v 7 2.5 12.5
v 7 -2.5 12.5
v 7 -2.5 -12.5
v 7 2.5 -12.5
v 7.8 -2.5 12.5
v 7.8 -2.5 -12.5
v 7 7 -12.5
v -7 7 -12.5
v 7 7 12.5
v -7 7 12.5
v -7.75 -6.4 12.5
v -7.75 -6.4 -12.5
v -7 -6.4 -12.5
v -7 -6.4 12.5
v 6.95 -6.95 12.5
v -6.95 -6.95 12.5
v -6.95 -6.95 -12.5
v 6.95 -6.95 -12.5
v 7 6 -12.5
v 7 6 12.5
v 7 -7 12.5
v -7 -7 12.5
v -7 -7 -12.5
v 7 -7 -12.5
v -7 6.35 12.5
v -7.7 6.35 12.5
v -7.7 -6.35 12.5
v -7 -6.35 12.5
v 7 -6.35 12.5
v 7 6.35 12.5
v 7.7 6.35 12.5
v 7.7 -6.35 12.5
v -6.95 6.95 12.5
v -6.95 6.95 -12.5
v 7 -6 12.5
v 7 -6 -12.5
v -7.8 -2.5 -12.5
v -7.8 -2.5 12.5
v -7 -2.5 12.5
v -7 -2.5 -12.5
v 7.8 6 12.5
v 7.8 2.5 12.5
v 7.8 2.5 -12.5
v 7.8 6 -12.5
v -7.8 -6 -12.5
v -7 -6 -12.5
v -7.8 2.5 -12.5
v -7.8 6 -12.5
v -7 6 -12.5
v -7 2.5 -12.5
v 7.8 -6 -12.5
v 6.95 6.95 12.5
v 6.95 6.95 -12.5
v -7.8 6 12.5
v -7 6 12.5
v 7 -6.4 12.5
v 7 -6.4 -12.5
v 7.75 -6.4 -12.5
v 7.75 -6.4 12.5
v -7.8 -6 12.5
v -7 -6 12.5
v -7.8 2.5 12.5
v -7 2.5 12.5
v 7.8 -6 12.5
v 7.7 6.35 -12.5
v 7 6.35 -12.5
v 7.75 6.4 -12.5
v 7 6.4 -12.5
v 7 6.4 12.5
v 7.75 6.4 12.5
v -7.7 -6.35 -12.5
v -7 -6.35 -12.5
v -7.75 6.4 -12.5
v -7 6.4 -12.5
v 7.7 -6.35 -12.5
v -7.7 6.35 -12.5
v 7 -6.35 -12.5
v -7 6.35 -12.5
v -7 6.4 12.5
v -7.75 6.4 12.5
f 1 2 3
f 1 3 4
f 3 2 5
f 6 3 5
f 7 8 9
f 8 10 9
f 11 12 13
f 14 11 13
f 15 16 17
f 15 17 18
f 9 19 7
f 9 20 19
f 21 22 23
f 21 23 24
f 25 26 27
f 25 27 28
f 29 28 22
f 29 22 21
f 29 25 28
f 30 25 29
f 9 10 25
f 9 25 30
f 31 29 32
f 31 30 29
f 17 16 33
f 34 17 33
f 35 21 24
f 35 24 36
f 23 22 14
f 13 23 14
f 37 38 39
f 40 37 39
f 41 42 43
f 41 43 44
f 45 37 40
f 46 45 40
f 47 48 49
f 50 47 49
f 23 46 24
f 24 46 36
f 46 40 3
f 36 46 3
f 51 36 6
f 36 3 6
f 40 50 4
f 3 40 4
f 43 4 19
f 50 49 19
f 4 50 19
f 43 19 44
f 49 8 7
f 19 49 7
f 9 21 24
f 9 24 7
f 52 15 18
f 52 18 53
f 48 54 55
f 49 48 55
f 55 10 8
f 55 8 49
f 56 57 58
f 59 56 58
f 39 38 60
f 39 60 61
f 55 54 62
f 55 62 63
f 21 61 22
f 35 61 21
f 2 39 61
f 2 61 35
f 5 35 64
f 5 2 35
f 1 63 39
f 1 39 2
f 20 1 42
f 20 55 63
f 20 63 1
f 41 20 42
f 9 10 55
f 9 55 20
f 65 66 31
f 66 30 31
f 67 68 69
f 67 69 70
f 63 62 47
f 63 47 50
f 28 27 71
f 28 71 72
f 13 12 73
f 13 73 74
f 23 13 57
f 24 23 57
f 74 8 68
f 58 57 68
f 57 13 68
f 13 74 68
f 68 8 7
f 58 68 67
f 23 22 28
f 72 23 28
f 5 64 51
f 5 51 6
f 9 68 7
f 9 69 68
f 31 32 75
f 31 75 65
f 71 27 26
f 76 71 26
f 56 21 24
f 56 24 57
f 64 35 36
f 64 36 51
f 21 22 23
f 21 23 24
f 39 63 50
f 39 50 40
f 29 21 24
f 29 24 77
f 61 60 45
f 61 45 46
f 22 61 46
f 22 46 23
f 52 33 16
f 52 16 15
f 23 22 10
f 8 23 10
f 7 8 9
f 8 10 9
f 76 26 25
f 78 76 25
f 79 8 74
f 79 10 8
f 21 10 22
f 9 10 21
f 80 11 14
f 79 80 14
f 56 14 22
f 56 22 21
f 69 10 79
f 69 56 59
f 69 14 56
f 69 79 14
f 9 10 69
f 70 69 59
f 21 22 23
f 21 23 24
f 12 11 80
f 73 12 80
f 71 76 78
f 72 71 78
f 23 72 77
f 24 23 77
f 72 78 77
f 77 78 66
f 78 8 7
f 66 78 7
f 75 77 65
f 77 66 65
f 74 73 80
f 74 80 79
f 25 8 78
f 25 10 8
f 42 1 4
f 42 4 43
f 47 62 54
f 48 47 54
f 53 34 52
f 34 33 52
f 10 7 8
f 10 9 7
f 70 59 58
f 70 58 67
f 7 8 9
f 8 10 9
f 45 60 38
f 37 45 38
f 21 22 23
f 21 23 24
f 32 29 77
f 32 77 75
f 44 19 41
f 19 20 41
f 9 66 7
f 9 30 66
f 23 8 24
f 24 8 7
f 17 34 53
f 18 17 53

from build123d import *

# Parameters (mm, degrees)
F0_W     = 14
F0_H     = 14
F1_DEPTH = 12.5
F2_W     = 14
F2_H     = 0.6
F2_W_2   = 0.75
F2_H_2   = 12.8
F3_DEPTH = 12.5
F4_W     = 0.8
F4_H     = 3.5
F5_DEPTH = 12.5
F6_W     = 13.9
F6_H     = 13.9
F7_DEPTH = 12.5
F8_W     = 14
F8_H     = 0.65
F8_W_2   = 0.7
F8_H_2   = 12.7
F9_DEPTH = 12.5


with BuildPart() as f1:
    # F0 (on Top) → F1 (new body, symmetric)
    with BuildSketch(Plane.XY):
        Rectangle(F0_W, F0_H)
    extrude(amount=F1_DEPTH, both=True)


with BuildPart() as f3:
    # F2 (on Top) → F3 (new body, symmetric)
    with BuildSketch(Plane.XY):
        with Locations((0, 6.7)):
            Rectangle(F2_W, F2_H)
        with Locations((7.375, 0)):
            Rectangle(F2_W_2, F2_H_2)
        Rectangle(F2_W, F2_H_2)
        with Locations((-7.375, 0)):
            Rectangle(F2_W_2, F2_H_2)
        with Locations((0, -6.7)):
            Rectangle(F2_W, F2_H)
    extrude(amount=F3_DEPTH, both=True)


with BuildPart() as f5:
    # F4 (on Top) → F5 (new body, symmetric)
    with BuildSketch(Plane.XY):
        Polygon((7, 6), (7, 7), (-7, 7), (-7, 6), (-7, 2.5), (-7, -2.5), (-7, -6), (-7, -7), (7, -7), (7, -6), (7, -2.5), (7, 2.5), align=None)
        with Locations((7.4, 4.25)):
            Rectangle(F4_W, F4_H)
        with Locations((-7.4, 4.25)):
            Rectangle(F4_W, F4_H)
        with Locations((7.4, -4.25)):
            Rectangle(F4_W, F4_H)
        with Locations((-7.4, -4.25)):
            Rectangle(F4_W, F4_H)
    extrude(amount=F5_DEPTH, both=True)


with BuildPart() as f7:
    # F6 (on Top) → F7 (new body, symmetric)
    with BuildSketch(Plane.XY):
        Rectangle(F6_W, F6_H)
    extrude(amount=F7_DEPTH, both=True)


with BuildPart() as f9:
    # F8 (on Top) → F9 (new body, symmetric)
    with BuildSketch(Plane.XY):
        with Locations((0, 6.675)):
            Rectangle(F8_W, F8_H)
        with Locations((7.35, 0)):
            Rectangle(F8_W_2, F8_H_2)
        Rectangle(F8_W, F8_H_2)
        with Locations((-7.35, 0)):
            Rectangle(F8_W_2, F8_H_2)
        with Locations((0, -6.675)):
            Rectangle(F8_W, F8_H)
    extrude(amount=F9_DEPTH, both=True)


solid = Compound([f1.part, f3.part, f5.part, f7.part, f9.part])
